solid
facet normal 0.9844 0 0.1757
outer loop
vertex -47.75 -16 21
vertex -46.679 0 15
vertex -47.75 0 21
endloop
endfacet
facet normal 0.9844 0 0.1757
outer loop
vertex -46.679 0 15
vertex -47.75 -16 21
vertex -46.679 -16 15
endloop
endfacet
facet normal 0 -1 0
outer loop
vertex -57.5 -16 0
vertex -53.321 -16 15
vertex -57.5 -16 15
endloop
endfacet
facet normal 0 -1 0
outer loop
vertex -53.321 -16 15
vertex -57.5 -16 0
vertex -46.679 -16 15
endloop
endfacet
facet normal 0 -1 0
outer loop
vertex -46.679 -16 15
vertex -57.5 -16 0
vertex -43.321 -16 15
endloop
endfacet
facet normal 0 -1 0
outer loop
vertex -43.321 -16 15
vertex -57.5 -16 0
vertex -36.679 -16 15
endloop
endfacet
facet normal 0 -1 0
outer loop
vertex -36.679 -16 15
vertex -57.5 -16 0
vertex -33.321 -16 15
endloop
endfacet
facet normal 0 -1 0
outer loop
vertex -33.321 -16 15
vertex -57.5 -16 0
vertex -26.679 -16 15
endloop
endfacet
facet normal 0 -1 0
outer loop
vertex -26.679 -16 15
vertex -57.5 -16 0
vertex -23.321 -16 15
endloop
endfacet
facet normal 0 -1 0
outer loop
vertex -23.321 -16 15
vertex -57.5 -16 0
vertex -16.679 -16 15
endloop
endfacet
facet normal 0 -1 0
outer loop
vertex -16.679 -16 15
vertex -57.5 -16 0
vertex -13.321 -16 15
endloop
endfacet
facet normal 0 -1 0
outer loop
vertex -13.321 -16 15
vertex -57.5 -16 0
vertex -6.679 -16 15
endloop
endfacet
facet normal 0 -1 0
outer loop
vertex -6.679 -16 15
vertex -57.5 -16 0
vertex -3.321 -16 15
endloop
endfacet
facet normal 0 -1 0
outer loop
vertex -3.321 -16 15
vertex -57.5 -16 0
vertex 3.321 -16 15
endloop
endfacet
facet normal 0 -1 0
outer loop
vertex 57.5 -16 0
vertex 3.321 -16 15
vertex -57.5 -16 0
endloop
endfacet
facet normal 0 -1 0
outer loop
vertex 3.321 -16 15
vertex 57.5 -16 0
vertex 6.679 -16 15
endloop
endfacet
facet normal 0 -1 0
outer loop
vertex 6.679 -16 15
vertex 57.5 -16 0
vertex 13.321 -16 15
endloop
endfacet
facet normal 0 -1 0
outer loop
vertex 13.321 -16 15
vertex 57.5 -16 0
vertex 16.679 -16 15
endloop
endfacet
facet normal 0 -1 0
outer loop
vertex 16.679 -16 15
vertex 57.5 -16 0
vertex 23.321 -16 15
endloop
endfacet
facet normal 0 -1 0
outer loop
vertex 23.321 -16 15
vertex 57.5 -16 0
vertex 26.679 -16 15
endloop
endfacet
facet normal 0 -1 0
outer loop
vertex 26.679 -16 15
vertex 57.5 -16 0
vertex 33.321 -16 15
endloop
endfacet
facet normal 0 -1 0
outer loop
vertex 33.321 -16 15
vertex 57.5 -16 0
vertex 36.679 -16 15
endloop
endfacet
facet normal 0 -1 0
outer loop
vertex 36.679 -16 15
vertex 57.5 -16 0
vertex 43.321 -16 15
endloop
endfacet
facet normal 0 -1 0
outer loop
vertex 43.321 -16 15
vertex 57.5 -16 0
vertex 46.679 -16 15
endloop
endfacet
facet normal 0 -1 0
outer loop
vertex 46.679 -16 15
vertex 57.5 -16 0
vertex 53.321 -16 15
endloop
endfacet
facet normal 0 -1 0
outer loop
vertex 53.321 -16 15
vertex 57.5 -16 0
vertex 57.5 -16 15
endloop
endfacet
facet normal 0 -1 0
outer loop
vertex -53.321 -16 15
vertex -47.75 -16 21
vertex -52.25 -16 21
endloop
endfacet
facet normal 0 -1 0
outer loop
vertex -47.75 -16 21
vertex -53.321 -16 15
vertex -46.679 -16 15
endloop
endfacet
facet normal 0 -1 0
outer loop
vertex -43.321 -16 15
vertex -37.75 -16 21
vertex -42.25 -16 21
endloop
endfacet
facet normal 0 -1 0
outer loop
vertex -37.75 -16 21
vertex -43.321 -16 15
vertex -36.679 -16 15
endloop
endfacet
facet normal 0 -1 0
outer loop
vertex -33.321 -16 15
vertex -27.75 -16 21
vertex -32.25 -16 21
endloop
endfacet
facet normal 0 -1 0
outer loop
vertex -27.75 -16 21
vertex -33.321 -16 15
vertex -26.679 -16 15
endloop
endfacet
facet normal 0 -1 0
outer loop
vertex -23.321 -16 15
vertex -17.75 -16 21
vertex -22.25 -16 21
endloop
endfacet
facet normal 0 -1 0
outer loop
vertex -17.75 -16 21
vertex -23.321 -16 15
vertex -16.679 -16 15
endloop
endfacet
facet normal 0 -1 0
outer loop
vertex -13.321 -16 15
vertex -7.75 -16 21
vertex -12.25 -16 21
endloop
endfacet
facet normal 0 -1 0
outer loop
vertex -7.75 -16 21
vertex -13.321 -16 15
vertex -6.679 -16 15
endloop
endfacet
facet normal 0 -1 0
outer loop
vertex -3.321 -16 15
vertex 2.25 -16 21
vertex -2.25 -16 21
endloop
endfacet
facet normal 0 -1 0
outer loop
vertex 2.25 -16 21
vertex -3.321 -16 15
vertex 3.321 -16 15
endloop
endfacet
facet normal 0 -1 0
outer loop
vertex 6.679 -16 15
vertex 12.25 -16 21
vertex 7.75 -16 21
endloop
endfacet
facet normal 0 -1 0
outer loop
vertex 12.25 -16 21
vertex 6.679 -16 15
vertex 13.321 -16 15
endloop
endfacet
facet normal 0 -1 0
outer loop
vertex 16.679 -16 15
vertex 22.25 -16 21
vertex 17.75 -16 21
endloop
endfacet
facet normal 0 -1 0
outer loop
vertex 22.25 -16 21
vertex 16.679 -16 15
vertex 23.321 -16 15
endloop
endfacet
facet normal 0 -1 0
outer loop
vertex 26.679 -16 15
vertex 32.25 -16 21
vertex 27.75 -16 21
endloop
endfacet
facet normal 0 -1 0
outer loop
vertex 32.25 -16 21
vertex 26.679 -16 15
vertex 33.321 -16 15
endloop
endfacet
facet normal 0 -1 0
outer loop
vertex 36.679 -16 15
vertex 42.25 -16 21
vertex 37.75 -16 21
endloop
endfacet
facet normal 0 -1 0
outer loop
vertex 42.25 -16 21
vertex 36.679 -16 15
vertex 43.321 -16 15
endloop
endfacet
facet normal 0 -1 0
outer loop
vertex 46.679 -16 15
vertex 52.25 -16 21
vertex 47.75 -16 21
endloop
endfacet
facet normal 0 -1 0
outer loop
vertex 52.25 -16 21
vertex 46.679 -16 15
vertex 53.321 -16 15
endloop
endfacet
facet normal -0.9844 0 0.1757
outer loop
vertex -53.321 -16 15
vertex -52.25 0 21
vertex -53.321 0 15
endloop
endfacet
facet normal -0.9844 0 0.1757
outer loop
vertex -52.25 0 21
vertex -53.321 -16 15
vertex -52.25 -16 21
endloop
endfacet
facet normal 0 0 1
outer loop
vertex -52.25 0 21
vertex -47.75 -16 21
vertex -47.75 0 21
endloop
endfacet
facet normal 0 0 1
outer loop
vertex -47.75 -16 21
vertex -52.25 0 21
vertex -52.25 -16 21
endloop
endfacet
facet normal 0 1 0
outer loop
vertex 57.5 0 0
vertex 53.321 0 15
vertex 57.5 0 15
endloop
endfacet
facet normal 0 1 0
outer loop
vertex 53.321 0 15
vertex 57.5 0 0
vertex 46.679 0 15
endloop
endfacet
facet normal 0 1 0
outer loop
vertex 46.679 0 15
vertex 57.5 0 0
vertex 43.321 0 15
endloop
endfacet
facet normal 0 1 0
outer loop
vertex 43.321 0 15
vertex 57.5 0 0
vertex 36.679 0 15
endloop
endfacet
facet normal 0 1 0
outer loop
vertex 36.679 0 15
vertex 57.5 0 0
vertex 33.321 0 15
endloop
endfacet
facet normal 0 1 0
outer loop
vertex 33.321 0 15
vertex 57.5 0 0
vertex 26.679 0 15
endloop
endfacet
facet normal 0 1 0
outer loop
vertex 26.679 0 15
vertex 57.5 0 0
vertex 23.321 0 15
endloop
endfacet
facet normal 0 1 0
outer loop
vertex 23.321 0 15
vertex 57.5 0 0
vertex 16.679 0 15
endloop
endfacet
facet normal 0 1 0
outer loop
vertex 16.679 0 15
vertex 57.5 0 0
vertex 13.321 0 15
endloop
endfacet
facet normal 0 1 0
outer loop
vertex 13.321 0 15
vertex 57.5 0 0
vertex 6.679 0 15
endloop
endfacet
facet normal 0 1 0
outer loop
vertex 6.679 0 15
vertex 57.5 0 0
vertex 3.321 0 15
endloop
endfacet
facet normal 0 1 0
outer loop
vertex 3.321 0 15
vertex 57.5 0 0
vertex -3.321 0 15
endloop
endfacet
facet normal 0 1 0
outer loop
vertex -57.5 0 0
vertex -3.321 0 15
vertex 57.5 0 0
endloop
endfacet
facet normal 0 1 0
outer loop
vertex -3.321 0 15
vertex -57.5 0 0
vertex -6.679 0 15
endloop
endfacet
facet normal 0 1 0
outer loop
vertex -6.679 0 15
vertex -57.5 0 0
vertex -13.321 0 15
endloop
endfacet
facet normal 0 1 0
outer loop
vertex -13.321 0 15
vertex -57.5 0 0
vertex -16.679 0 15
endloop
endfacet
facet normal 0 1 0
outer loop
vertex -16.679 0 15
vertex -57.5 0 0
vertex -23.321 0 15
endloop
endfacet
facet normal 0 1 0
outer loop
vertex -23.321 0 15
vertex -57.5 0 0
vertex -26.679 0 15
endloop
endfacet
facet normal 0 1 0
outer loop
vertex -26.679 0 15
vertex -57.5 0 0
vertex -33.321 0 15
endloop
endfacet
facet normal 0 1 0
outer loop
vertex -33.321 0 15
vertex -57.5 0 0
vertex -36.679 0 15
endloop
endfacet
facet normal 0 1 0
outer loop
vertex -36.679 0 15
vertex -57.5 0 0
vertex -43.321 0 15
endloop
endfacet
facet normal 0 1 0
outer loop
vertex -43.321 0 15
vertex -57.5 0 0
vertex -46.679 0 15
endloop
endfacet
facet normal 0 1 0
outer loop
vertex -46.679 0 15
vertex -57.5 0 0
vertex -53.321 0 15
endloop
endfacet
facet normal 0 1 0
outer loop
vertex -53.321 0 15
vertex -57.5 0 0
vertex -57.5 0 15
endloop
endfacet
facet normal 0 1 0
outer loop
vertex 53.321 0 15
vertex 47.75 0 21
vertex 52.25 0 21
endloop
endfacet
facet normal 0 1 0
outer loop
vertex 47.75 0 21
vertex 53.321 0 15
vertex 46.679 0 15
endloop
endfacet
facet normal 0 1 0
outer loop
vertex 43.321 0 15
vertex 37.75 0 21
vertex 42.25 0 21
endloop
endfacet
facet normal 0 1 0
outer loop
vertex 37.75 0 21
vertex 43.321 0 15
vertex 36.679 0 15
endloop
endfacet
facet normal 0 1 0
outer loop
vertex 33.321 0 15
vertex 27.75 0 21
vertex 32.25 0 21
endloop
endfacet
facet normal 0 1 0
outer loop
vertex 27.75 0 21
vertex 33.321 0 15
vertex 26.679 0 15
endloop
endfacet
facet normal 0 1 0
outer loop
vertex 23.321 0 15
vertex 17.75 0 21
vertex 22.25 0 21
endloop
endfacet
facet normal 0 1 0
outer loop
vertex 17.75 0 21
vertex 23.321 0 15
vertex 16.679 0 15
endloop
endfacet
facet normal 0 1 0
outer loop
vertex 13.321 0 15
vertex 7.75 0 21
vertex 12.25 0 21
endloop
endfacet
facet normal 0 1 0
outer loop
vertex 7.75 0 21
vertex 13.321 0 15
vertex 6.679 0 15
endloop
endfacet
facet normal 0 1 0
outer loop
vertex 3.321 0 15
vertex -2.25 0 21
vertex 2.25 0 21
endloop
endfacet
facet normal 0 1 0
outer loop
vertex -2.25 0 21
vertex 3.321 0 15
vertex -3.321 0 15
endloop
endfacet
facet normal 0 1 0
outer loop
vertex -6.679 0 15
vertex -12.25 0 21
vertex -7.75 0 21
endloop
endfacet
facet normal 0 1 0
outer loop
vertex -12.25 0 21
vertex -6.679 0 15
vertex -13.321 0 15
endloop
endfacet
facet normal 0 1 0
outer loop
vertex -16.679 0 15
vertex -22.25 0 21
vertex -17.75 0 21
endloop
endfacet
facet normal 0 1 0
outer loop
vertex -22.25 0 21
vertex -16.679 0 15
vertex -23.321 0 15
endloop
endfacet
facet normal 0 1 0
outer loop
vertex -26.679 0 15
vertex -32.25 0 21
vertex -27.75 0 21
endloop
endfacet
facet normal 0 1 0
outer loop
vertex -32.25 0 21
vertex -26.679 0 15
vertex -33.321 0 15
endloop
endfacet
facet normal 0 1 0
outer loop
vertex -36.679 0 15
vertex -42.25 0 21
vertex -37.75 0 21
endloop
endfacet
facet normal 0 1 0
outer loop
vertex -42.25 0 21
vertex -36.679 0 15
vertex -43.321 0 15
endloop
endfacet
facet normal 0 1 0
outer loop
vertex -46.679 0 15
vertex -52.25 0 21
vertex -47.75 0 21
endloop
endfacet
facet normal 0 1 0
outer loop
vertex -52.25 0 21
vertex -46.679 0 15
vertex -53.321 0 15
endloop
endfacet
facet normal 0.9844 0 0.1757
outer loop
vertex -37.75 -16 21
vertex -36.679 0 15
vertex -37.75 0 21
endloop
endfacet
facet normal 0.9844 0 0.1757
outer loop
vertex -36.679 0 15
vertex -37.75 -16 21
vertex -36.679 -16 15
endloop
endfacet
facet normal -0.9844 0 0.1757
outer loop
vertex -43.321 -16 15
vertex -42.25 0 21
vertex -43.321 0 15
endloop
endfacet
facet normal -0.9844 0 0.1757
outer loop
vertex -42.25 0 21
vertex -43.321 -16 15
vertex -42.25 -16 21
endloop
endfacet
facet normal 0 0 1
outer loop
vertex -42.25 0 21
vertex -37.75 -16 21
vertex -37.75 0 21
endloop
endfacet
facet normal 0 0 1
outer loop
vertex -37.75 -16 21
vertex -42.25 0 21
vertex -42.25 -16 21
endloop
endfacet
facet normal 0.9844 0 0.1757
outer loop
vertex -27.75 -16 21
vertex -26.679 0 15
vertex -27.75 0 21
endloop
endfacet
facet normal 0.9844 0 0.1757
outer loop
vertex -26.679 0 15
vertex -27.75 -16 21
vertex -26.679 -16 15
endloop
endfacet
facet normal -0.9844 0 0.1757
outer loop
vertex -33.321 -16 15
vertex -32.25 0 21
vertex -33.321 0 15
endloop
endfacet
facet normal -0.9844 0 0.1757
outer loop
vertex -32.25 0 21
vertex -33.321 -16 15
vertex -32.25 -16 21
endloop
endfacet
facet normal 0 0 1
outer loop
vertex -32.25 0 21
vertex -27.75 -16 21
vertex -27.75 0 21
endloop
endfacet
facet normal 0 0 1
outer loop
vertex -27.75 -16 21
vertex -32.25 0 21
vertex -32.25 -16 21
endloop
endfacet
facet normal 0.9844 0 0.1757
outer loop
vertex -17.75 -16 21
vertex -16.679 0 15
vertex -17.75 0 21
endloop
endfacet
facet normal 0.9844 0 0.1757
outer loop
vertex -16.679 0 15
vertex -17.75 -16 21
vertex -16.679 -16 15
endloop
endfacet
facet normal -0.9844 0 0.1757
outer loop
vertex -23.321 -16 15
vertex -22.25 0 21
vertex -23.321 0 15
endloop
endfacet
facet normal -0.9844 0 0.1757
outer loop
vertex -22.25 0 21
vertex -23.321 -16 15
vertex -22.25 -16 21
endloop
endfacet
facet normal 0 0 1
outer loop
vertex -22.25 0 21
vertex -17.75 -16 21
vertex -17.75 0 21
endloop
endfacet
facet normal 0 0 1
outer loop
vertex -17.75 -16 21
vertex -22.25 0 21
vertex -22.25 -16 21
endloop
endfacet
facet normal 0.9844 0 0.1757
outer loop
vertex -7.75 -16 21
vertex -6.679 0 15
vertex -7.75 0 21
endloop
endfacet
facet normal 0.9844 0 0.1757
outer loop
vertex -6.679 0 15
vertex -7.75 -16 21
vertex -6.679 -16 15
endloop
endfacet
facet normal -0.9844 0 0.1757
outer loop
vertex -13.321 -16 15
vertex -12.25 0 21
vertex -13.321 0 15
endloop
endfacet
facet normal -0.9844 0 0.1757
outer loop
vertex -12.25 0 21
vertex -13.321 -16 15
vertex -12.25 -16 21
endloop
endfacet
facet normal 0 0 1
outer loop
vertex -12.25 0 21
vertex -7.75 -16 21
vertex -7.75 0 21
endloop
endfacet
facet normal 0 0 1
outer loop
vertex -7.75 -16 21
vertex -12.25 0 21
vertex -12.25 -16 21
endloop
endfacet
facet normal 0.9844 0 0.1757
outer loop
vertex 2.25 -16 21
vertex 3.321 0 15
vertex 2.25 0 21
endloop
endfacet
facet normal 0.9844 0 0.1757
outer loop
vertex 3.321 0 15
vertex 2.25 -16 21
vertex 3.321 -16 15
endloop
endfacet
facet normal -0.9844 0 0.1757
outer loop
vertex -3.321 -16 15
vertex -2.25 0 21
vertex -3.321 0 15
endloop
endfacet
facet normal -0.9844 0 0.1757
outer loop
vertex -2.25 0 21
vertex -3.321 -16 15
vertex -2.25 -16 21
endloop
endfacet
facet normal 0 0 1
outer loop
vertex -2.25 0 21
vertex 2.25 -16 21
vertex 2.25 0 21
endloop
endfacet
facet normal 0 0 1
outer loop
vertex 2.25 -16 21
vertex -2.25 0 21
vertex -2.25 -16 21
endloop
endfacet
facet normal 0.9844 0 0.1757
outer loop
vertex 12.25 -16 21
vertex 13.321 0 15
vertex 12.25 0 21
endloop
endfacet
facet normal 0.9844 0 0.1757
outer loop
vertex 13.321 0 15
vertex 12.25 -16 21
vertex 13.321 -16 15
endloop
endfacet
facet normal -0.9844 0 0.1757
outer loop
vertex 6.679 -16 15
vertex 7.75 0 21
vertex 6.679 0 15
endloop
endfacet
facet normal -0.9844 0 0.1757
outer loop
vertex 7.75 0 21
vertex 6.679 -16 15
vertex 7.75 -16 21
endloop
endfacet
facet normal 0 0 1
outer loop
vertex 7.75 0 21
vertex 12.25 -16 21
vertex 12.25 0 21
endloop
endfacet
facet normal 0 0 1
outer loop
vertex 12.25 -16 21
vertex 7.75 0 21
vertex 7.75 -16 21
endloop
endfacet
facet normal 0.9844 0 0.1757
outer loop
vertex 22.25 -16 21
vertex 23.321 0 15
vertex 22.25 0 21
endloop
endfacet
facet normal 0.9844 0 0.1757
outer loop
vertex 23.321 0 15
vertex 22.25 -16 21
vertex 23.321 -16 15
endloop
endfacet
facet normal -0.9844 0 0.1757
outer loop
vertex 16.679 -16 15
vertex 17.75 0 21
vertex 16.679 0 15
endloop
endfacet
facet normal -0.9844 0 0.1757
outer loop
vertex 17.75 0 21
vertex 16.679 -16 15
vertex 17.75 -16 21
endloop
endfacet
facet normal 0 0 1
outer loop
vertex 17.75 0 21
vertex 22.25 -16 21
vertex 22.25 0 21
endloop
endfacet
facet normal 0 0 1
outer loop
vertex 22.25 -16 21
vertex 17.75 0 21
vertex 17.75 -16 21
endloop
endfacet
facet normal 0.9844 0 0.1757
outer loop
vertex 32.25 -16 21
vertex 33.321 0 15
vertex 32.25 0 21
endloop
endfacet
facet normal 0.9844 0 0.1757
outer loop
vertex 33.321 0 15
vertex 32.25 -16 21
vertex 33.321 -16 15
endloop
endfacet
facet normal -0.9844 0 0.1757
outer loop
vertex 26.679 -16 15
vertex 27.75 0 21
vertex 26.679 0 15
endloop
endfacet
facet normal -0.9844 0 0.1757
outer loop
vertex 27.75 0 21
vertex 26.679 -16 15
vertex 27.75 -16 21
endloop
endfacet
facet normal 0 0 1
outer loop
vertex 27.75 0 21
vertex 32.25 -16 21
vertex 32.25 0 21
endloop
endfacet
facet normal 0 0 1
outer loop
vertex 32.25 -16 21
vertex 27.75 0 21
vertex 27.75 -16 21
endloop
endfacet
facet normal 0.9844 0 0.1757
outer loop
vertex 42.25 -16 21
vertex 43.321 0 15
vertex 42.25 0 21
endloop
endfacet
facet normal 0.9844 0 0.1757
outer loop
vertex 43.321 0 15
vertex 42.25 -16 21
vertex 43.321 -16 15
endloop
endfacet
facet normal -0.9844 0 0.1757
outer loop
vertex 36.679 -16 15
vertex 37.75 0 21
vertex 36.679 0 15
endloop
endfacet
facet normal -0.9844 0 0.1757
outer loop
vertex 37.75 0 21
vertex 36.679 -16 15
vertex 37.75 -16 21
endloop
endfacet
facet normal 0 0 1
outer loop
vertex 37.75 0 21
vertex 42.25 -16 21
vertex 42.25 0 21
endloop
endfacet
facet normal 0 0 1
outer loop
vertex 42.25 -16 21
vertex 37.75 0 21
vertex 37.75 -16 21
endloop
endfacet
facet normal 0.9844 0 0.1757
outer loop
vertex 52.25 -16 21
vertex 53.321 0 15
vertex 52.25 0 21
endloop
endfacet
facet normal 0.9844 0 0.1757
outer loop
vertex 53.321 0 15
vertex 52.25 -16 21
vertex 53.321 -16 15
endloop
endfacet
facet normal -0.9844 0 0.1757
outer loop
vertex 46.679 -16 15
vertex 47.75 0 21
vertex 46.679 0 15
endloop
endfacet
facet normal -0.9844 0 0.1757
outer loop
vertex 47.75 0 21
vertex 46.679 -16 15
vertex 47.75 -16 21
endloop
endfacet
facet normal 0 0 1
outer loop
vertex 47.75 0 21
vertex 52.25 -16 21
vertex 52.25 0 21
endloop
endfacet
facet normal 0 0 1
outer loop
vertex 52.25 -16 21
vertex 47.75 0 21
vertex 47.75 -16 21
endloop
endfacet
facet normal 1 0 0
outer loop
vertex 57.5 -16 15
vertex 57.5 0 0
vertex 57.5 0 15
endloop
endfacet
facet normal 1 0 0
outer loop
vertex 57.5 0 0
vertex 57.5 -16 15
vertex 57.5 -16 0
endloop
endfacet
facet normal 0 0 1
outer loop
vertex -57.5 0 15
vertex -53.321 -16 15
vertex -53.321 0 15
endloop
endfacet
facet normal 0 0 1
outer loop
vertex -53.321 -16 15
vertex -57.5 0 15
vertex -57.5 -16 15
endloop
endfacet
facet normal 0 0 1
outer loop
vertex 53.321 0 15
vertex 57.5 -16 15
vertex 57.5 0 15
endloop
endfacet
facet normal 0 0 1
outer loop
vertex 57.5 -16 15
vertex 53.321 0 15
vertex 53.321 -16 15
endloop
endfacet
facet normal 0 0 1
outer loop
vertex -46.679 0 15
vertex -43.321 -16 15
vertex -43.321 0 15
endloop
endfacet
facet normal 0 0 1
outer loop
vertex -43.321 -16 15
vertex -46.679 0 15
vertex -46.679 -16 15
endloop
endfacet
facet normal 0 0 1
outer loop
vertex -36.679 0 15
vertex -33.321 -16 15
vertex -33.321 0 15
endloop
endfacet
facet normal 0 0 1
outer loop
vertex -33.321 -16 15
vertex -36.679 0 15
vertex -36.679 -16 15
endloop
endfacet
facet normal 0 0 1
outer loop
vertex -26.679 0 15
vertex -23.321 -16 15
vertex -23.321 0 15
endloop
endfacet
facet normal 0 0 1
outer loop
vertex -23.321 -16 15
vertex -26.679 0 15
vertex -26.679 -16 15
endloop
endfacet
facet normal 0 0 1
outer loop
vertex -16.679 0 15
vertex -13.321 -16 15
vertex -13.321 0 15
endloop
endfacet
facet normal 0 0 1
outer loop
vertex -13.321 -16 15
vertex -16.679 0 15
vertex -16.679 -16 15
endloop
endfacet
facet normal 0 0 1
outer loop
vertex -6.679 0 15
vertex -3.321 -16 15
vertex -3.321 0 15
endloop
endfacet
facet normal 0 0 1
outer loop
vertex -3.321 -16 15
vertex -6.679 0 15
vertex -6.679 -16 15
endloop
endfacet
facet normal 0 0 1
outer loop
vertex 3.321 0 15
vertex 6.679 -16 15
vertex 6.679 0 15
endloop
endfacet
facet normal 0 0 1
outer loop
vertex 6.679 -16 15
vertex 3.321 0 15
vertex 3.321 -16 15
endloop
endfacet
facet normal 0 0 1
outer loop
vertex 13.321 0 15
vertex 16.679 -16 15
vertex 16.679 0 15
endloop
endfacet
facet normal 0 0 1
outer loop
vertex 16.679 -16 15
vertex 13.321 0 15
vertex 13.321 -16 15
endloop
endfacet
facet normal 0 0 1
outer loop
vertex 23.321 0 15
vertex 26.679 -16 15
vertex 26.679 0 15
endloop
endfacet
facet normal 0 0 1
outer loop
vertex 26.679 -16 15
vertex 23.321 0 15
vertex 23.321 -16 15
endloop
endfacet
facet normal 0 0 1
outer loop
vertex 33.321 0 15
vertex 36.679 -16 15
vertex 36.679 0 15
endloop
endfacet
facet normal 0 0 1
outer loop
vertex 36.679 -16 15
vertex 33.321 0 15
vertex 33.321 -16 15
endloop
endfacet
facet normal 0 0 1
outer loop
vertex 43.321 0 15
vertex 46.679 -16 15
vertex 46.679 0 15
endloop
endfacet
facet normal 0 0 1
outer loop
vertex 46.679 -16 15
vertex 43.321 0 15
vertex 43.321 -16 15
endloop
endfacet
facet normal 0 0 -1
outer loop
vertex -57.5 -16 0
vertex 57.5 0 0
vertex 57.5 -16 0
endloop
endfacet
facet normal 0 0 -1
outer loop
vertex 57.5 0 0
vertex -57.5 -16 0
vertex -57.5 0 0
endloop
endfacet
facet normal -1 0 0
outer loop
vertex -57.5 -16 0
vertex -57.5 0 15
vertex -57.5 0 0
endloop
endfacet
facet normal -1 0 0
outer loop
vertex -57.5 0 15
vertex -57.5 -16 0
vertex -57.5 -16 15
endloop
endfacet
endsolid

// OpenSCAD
$fn = 32;

// ----------------------------------------------------------------------
// Toothed rack, 11 teeth
// 10 mm pitch, 6 mm teeth
// ----------------------------------------------------------------------

// --- parameters (mm) ---
bar_w = 16;     // bar width (Y)
bar_h = 15;     // bar height (Z)
teeth = 11;     // number of teeth
pitch = 10;     // tooth pitch
tooth_h = 6;    // tooth height above the bar
root_w = 7;     // tooth width at the root
crest_w = 4.5;  // tooth width at the crest

// --- derived feature positions (mm) ---
span = (teeth - 1) * pitch;  // = 100   distance between the outer teeth
bar_l = span + root_w + 8;   // = 115   bar length: teeth plus 4 mm at each end
tooth_x = -span / 2;         // = -50   X of the first tooth
height = bar_h + tooth_h;    // = 21   overall height
feature_centers = [
  [tooth_x + 0 * pitch, -bar_w / 2],
  [tooth_x + 1 * pitch, -bar_w / 2],
  [tooth_x + 2 * pitch, -bar_w / 2],
  [tooth_x + 3 * pitch, -bar_w / 2],
  [tooth_x + 4 * pitch, -bar_w / 2],
  [tooth_x + 5 * pitch, -bar_w / 2],
  [tooth_x + 6 * pitch, -bar_w / 2],
  [tooth_x + 7 * pitch, -bar_w / 2],
  [tooth_x + 8 * pitch, -bar_w / 2],
  [tooth_x + 9 * pitch, -bar_w / 2],
  [tooth_x + 10 * pitch, -bar_w / 2]
];   // tooth centre line, drives the tooth loop

// bar with a rack of teeth, one extruded trapezoium per centre
module rack_tooth() {
  linear_extrude(height = bar_w)
    polygon(points = [
      [0, 0],
      [root_w, 0],
      [root_w / 2 + crest_w / 2, tooth_h + 1],
      [root_w / 2 - crest_w / 2, tooth_h + 1]
    ]);
}

union() {
  translate([-bar_l / 2, -bar_w, 0]) cube([bar_l, bar_w, bar_h]);
  for (centre = feature_centers)
    translate([centre[0] - root_w / 2, 0, bar_h - 1]) rotate([90, 0, 0]) rack_tooth();
}
